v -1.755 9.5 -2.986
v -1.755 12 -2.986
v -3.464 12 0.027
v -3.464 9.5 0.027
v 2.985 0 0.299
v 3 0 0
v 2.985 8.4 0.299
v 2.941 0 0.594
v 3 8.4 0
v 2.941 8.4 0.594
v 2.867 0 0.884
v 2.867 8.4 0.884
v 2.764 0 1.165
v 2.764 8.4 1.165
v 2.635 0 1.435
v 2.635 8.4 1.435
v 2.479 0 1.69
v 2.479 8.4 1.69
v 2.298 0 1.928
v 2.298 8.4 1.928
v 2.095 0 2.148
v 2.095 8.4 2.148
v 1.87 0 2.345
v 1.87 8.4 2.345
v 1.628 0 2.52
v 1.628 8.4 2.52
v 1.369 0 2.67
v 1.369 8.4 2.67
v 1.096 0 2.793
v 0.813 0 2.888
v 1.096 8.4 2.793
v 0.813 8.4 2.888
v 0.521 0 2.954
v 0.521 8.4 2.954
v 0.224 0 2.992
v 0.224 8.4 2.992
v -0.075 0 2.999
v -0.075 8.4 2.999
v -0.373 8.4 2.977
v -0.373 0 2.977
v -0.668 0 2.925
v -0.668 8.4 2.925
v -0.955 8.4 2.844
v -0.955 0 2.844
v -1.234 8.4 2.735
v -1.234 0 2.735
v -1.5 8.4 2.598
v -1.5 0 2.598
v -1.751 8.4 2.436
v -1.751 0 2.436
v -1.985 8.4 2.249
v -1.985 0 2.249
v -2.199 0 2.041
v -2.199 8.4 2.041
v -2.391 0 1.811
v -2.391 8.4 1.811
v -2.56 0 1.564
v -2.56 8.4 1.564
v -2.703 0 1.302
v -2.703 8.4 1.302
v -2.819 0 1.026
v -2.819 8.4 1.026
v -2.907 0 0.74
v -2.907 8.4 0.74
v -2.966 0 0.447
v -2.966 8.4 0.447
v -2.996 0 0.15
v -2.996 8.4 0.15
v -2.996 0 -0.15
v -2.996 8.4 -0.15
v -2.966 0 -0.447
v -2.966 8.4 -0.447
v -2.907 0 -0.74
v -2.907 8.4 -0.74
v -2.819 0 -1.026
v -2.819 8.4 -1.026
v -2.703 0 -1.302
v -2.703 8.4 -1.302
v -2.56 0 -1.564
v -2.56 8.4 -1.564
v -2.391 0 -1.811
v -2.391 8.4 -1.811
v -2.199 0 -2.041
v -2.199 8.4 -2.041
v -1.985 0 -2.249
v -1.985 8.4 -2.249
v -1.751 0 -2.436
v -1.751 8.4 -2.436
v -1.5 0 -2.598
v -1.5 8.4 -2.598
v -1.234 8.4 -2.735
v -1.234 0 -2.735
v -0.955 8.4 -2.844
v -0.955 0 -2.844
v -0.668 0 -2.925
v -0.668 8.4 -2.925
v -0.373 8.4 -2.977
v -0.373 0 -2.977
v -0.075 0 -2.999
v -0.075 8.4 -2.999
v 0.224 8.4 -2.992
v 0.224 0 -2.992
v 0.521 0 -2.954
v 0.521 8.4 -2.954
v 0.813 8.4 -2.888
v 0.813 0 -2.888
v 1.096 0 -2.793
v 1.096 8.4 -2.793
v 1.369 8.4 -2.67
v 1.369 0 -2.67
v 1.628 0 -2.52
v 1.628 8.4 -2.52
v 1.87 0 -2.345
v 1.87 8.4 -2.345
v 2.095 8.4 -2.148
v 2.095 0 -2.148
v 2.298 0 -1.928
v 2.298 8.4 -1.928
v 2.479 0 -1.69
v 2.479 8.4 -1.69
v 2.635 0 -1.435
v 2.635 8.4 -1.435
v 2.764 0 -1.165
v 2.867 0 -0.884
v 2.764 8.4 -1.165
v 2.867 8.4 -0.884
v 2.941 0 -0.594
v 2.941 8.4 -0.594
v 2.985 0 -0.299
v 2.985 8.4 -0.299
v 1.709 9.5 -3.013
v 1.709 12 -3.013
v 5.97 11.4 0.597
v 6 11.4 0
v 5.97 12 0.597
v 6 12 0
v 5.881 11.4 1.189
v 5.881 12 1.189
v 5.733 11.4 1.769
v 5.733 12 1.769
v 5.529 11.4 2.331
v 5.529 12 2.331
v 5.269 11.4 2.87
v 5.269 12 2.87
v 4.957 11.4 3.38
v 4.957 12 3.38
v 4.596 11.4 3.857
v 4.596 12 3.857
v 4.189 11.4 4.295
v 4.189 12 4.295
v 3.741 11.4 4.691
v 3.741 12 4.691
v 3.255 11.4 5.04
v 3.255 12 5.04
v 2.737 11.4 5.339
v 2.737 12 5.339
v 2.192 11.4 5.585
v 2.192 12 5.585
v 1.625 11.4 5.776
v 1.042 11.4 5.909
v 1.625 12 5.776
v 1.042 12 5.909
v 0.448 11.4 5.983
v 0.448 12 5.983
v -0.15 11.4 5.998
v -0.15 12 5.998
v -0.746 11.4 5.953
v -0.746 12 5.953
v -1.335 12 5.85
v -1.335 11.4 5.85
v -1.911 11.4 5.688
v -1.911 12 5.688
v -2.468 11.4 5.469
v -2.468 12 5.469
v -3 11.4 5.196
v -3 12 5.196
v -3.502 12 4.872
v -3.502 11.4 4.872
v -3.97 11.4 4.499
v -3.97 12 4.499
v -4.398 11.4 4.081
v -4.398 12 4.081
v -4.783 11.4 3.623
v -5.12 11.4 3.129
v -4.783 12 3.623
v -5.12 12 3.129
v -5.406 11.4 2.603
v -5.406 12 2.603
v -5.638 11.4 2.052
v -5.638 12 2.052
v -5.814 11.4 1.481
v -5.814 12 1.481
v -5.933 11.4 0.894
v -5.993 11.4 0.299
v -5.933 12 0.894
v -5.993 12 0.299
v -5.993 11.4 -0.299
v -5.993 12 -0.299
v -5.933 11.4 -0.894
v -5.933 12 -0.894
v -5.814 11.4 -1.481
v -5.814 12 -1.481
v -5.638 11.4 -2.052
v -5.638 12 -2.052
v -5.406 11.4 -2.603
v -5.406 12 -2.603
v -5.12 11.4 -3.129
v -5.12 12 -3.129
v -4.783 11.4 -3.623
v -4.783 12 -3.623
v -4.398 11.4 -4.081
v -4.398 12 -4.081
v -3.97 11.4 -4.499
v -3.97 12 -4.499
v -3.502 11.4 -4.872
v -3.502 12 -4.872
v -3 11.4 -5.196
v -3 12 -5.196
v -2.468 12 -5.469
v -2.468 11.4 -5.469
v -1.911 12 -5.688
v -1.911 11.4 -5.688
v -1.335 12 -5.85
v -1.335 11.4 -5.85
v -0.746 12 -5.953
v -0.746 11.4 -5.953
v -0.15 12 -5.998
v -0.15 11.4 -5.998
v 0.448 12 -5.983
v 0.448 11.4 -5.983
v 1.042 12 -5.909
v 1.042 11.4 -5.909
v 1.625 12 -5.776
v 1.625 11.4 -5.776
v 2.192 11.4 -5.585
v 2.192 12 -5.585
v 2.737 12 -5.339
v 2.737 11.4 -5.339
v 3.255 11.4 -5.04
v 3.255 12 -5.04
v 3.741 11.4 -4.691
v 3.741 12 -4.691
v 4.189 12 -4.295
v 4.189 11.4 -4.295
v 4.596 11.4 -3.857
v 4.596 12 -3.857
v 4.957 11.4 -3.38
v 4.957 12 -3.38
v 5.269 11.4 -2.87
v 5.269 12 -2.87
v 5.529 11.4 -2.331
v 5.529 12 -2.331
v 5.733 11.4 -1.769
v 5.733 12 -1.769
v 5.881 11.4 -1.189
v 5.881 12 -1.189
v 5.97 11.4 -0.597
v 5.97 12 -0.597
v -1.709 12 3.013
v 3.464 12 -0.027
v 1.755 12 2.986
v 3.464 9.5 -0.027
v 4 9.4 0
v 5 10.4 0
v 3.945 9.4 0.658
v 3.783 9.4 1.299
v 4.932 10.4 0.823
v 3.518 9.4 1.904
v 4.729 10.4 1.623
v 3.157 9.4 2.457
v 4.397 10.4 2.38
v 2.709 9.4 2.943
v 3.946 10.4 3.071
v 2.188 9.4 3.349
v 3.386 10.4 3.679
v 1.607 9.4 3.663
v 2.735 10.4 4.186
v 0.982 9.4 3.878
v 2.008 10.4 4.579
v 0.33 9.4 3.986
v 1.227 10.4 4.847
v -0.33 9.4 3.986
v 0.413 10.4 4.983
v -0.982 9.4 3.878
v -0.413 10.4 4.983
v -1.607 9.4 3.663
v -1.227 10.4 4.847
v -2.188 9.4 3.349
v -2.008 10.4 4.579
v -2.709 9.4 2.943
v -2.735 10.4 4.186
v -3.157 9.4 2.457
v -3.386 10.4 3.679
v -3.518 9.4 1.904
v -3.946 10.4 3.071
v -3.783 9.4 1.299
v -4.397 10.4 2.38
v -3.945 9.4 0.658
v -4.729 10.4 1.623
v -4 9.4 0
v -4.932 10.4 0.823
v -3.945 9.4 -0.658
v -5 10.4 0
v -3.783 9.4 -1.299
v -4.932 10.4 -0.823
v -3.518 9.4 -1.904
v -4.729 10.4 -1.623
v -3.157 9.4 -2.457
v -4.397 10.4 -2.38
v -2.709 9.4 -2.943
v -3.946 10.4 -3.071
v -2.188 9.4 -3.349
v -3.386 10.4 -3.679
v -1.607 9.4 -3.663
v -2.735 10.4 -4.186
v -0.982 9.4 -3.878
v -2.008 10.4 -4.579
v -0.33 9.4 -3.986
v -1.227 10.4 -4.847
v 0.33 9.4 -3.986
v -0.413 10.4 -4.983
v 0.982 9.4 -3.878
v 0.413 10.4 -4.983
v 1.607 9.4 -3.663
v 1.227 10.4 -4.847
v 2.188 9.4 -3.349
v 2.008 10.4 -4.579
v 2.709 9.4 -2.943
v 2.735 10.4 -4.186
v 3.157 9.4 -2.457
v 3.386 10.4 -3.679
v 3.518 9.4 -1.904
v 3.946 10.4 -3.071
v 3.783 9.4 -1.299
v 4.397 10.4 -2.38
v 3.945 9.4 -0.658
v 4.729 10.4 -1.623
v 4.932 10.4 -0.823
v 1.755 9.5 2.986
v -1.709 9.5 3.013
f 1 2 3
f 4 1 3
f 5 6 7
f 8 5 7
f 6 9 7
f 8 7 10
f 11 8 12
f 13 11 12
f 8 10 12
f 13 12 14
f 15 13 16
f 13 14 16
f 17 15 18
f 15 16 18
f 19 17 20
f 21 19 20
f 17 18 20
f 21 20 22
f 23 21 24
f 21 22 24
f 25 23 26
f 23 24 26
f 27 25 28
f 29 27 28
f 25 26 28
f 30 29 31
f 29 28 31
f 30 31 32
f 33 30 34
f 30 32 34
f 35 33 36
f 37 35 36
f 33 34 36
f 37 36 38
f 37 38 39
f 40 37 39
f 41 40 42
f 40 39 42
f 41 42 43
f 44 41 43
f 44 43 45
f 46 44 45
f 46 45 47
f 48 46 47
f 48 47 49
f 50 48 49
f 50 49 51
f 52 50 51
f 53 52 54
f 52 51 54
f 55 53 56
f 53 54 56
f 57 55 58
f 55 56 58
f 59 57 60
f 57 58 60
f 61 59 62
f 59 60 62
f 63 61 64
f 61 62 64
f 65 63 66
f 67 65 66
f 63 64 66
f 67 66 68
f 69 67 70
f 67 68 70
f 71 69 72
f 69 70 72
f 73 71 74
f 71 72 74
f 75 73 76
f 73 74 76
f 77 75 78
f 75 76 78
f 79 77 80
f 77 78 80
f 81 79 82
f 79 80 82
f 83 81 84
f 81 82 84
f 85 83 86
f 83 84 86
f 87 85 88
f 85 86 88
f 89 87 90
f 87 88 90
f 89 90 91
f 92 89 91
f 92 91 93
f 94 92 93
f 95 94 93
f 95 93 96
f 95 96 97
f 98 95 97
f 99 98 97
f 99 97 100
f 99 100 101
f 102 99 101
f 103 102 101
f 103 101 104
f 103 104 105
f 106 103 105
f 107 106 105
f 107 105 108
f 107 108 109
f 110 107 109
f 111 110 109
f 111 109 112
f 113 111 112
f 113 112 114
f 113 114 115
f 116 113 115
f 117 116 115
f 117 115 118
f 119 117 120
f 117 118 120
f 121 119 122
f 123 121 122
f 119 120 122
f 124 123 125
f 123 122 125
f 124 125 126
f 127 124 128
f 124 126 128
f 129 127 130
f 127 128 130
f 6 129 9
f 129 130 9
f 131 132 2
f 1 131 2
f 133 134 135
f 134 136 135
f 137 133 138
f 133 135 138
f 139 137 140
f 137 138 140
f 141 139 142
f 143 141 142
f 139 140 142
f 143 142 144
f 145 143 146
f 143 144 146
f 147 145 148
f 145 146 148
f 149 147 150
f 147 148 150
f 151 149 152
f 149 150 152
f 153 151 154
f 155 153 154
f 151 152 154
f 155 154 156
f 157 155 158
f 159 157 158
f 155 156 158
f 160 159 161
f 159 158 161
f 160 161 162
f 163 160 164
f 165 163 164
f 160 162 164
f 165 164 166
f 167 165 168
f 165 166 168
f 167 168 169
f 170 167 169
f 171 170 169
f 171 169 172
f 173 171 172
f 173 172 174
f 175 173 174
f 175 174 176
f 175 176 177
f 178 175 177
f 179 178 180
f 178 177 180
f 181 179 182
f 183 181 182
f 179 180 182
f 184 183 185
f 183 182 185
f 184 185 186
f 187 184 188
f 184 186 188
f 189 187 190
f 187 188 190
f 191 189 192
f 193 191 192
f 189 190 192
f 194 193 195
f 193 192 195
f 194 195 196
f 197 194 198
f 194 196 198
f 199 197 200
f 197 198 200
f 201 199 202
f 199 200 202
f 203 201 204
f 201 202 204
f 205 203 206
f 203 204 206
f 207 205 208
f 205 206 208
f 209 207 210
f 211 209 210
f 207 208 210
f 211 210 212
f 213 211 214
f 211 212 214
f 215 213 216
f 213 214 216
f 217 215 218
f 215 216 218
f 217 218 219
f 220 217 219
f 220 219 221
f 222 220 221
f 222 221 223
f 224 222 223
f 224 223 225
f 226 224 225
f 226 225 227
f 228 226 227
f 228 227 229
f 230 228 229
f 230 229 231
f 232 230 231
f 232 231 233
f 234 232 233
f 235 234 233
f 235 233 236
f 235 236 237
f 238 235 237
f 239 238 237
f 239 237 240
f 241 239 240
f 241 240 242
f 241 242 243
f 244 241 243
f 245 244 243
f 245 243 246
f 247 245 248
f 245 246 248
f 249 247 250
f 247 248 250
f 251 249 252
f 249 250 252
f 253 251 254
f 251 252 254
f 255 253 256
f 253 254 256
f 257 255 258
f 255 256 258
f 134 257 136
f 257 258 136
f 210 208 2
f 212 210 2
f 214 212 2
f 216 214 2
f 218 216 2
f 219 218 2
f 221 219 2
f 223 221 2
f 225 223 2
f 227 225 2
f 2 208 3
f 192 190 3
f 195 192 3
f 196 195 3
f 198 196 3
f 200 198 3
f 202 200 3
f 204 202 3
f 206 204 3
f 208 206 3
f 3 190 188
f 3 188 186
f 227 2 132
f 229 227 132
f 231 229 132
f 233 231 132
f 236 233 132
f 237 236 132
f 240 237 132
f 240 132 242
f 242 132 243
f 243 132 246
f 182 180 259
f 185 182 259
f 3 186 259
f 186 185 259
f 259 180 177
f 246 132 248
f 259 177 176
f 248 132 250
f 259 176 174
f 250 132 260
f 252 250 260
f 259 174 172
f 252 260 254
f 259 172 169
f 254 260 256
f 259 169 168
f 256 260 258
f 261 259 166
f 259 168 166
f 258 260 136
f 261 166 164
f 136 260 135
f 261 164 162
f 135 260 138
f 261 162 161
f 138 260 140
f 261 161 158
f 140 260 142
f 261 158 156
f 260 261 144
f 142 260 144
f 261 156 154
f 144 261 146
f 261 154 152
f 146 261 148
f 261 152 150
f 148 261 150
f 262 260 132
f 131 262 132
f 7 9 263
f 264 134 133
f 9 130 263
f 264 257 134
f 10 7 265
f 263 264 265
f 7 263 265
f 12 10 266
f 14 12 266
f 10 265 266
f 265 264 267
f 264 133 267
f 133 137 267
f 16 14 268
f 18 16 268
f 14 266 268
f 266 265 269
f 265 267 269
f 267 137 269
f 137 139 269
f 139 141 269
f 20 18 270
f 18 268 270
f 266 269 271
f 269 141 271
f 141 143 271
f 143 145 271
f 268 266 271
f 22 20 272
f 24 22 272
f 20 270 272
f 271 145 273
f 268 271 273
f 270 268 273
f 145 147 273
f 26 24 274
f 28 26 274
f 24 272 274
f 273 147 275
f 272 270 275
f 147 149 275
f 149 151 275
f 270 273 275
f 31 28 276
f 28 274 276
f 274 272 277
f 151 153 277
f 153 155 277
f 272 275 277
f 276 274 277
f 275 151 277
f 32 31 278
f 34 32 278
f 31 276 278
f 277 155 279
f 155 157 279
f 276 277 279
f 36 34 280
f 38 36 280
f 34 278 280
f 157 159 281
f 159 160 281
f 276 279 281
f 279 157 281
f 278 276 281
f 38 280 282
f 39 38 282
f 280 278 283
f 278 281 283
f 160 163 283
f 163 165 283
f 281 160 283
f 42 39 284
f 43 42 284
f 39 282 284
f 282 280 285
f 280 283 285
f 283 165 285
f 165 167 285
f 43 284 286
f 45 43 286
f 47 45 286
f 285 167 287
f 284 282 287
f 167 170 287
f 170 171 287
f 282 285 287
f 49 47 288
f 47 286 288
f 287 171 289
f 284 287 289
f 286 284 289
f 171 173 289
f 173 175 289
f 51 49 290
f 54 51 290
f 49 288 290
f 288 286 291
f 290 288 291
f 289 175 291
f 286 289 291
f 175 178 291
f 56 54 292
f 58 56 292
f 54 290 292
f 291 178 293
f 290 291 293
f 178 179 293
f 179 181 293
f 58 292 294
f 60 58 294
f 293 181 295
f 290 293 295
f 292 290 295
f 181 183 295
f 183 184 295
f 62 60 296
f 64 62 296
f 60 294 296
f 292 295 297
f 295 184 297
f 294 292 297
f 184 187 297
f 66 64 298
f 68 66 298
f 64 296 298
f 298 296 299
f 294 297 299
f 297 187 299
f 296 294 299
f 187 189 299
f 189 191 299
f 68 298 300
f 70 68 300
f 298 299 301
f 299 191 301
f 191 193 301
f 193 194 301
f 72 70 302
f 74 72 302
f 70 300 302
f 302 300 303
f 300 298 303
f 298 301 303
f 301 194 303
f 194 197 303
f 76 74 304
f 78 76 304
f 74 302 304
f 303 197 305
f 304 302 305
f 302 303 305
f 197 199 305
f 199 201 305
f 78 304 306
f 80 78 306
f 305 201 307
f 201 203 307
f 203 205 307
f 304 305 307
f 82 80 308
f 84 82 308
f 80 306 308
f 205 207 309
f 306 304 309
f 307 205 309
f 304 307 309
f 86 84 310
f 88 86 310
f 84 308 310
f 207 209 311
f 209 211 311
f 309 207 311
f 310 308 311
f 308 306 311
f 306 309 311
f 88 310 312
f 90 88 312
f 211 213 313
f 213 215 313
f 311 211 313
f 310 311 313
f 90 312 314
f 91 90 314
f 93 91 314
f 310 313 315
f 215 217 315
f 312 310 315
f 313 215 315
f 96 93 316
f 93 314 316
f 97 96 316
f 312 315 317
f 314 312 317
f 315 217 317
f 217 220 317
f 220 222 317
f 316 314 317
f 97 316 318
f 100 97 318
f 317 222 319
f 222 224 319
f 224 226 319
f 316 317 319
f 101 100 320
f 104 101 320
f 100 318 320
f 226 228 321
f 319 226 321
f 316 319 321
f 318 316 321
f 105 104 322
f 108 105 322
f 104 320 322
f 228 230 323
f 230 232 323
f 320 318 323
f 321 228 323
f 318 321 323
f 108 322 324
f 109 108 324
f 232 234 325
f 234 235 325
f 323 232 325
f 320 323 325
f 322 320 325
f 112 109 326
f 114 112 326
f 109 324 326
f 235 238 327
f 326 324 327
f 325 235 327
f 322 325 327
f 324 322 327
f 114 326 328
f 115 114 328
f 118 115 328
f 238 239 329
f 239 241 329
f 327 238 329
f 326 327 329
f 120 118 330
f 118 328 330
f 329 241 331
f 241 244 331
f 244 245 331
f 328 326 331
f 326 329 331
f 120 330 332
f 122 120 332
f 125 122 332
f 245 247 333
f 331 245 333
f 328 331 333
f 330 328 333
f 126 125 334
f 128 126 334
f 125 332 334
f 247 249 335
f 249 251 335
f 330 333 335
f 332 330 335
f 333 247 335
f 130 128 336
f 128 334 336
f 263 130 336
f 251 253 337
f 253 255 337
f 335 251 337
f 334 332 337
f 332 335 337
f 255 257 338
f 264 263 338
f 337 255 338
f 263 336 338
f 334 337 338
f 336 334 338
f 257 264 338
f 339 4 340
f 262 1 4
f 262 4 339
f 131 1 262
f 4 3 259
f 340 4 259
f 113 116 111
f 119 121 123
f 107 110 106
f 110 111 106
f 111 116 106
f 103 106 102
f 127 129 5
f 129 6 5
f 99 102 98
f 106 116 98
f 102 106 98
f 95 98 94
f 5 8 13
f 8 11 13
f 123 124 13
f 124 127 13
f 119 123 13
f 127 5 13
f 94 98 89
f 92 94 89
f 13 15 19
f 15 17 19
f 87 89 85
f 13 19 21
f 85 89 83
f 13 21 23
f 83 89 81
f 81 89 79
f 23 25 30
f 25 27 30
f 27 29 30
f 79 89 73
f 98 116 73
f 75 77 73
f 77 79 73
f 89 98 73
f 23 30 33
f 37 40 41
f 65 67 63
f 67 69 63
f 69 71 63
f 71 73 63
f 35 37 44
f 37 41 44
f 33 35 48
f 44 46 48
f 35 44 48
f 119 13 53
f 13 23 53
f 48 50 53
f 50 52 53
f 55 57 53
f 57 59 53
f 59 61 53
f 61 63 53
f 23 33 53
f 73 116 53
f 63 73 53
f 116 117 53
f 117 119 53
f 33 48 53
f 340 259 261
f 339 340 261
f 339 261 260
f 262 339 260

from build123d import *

# Parameters (mm, degrees)
CUT_EXTRUDE_1_DEPTH = 2.5


with BuildPart() as part:
    # Эскиз1 → Повернуть1 (revolve)
    with BuildSketch(Plane.XY):
        Polygon((0, 0), (3, 0), (3, 8.4), (6, 11.4), (6, 12), (0, 12), align=None)
    revolve(axis=Axis((0, 68.644575989, 0), (0, -1, 0)))

    # Эскиз2 → Вырез-Вытянуть1 (cut)
    with BuildSketch(Plane(origin=(0, 12, 0), x_dir=(1, 0, 0), z_dir=(0, 1, 0))):
        Polygon((1.755265403, -2.986476748), (3.463997433, 0.026866056), (1.708732029, 3.013342804), (-1.755265403, 2.986476748), (-3.463997433, -0.026866056), (-1.708732029, -3.013342804), align=None)
    extrude(amount=-CUT_EXTRUDE_1_DEPTH, mode=Mode.SUBTRACT)


solid = part.part
